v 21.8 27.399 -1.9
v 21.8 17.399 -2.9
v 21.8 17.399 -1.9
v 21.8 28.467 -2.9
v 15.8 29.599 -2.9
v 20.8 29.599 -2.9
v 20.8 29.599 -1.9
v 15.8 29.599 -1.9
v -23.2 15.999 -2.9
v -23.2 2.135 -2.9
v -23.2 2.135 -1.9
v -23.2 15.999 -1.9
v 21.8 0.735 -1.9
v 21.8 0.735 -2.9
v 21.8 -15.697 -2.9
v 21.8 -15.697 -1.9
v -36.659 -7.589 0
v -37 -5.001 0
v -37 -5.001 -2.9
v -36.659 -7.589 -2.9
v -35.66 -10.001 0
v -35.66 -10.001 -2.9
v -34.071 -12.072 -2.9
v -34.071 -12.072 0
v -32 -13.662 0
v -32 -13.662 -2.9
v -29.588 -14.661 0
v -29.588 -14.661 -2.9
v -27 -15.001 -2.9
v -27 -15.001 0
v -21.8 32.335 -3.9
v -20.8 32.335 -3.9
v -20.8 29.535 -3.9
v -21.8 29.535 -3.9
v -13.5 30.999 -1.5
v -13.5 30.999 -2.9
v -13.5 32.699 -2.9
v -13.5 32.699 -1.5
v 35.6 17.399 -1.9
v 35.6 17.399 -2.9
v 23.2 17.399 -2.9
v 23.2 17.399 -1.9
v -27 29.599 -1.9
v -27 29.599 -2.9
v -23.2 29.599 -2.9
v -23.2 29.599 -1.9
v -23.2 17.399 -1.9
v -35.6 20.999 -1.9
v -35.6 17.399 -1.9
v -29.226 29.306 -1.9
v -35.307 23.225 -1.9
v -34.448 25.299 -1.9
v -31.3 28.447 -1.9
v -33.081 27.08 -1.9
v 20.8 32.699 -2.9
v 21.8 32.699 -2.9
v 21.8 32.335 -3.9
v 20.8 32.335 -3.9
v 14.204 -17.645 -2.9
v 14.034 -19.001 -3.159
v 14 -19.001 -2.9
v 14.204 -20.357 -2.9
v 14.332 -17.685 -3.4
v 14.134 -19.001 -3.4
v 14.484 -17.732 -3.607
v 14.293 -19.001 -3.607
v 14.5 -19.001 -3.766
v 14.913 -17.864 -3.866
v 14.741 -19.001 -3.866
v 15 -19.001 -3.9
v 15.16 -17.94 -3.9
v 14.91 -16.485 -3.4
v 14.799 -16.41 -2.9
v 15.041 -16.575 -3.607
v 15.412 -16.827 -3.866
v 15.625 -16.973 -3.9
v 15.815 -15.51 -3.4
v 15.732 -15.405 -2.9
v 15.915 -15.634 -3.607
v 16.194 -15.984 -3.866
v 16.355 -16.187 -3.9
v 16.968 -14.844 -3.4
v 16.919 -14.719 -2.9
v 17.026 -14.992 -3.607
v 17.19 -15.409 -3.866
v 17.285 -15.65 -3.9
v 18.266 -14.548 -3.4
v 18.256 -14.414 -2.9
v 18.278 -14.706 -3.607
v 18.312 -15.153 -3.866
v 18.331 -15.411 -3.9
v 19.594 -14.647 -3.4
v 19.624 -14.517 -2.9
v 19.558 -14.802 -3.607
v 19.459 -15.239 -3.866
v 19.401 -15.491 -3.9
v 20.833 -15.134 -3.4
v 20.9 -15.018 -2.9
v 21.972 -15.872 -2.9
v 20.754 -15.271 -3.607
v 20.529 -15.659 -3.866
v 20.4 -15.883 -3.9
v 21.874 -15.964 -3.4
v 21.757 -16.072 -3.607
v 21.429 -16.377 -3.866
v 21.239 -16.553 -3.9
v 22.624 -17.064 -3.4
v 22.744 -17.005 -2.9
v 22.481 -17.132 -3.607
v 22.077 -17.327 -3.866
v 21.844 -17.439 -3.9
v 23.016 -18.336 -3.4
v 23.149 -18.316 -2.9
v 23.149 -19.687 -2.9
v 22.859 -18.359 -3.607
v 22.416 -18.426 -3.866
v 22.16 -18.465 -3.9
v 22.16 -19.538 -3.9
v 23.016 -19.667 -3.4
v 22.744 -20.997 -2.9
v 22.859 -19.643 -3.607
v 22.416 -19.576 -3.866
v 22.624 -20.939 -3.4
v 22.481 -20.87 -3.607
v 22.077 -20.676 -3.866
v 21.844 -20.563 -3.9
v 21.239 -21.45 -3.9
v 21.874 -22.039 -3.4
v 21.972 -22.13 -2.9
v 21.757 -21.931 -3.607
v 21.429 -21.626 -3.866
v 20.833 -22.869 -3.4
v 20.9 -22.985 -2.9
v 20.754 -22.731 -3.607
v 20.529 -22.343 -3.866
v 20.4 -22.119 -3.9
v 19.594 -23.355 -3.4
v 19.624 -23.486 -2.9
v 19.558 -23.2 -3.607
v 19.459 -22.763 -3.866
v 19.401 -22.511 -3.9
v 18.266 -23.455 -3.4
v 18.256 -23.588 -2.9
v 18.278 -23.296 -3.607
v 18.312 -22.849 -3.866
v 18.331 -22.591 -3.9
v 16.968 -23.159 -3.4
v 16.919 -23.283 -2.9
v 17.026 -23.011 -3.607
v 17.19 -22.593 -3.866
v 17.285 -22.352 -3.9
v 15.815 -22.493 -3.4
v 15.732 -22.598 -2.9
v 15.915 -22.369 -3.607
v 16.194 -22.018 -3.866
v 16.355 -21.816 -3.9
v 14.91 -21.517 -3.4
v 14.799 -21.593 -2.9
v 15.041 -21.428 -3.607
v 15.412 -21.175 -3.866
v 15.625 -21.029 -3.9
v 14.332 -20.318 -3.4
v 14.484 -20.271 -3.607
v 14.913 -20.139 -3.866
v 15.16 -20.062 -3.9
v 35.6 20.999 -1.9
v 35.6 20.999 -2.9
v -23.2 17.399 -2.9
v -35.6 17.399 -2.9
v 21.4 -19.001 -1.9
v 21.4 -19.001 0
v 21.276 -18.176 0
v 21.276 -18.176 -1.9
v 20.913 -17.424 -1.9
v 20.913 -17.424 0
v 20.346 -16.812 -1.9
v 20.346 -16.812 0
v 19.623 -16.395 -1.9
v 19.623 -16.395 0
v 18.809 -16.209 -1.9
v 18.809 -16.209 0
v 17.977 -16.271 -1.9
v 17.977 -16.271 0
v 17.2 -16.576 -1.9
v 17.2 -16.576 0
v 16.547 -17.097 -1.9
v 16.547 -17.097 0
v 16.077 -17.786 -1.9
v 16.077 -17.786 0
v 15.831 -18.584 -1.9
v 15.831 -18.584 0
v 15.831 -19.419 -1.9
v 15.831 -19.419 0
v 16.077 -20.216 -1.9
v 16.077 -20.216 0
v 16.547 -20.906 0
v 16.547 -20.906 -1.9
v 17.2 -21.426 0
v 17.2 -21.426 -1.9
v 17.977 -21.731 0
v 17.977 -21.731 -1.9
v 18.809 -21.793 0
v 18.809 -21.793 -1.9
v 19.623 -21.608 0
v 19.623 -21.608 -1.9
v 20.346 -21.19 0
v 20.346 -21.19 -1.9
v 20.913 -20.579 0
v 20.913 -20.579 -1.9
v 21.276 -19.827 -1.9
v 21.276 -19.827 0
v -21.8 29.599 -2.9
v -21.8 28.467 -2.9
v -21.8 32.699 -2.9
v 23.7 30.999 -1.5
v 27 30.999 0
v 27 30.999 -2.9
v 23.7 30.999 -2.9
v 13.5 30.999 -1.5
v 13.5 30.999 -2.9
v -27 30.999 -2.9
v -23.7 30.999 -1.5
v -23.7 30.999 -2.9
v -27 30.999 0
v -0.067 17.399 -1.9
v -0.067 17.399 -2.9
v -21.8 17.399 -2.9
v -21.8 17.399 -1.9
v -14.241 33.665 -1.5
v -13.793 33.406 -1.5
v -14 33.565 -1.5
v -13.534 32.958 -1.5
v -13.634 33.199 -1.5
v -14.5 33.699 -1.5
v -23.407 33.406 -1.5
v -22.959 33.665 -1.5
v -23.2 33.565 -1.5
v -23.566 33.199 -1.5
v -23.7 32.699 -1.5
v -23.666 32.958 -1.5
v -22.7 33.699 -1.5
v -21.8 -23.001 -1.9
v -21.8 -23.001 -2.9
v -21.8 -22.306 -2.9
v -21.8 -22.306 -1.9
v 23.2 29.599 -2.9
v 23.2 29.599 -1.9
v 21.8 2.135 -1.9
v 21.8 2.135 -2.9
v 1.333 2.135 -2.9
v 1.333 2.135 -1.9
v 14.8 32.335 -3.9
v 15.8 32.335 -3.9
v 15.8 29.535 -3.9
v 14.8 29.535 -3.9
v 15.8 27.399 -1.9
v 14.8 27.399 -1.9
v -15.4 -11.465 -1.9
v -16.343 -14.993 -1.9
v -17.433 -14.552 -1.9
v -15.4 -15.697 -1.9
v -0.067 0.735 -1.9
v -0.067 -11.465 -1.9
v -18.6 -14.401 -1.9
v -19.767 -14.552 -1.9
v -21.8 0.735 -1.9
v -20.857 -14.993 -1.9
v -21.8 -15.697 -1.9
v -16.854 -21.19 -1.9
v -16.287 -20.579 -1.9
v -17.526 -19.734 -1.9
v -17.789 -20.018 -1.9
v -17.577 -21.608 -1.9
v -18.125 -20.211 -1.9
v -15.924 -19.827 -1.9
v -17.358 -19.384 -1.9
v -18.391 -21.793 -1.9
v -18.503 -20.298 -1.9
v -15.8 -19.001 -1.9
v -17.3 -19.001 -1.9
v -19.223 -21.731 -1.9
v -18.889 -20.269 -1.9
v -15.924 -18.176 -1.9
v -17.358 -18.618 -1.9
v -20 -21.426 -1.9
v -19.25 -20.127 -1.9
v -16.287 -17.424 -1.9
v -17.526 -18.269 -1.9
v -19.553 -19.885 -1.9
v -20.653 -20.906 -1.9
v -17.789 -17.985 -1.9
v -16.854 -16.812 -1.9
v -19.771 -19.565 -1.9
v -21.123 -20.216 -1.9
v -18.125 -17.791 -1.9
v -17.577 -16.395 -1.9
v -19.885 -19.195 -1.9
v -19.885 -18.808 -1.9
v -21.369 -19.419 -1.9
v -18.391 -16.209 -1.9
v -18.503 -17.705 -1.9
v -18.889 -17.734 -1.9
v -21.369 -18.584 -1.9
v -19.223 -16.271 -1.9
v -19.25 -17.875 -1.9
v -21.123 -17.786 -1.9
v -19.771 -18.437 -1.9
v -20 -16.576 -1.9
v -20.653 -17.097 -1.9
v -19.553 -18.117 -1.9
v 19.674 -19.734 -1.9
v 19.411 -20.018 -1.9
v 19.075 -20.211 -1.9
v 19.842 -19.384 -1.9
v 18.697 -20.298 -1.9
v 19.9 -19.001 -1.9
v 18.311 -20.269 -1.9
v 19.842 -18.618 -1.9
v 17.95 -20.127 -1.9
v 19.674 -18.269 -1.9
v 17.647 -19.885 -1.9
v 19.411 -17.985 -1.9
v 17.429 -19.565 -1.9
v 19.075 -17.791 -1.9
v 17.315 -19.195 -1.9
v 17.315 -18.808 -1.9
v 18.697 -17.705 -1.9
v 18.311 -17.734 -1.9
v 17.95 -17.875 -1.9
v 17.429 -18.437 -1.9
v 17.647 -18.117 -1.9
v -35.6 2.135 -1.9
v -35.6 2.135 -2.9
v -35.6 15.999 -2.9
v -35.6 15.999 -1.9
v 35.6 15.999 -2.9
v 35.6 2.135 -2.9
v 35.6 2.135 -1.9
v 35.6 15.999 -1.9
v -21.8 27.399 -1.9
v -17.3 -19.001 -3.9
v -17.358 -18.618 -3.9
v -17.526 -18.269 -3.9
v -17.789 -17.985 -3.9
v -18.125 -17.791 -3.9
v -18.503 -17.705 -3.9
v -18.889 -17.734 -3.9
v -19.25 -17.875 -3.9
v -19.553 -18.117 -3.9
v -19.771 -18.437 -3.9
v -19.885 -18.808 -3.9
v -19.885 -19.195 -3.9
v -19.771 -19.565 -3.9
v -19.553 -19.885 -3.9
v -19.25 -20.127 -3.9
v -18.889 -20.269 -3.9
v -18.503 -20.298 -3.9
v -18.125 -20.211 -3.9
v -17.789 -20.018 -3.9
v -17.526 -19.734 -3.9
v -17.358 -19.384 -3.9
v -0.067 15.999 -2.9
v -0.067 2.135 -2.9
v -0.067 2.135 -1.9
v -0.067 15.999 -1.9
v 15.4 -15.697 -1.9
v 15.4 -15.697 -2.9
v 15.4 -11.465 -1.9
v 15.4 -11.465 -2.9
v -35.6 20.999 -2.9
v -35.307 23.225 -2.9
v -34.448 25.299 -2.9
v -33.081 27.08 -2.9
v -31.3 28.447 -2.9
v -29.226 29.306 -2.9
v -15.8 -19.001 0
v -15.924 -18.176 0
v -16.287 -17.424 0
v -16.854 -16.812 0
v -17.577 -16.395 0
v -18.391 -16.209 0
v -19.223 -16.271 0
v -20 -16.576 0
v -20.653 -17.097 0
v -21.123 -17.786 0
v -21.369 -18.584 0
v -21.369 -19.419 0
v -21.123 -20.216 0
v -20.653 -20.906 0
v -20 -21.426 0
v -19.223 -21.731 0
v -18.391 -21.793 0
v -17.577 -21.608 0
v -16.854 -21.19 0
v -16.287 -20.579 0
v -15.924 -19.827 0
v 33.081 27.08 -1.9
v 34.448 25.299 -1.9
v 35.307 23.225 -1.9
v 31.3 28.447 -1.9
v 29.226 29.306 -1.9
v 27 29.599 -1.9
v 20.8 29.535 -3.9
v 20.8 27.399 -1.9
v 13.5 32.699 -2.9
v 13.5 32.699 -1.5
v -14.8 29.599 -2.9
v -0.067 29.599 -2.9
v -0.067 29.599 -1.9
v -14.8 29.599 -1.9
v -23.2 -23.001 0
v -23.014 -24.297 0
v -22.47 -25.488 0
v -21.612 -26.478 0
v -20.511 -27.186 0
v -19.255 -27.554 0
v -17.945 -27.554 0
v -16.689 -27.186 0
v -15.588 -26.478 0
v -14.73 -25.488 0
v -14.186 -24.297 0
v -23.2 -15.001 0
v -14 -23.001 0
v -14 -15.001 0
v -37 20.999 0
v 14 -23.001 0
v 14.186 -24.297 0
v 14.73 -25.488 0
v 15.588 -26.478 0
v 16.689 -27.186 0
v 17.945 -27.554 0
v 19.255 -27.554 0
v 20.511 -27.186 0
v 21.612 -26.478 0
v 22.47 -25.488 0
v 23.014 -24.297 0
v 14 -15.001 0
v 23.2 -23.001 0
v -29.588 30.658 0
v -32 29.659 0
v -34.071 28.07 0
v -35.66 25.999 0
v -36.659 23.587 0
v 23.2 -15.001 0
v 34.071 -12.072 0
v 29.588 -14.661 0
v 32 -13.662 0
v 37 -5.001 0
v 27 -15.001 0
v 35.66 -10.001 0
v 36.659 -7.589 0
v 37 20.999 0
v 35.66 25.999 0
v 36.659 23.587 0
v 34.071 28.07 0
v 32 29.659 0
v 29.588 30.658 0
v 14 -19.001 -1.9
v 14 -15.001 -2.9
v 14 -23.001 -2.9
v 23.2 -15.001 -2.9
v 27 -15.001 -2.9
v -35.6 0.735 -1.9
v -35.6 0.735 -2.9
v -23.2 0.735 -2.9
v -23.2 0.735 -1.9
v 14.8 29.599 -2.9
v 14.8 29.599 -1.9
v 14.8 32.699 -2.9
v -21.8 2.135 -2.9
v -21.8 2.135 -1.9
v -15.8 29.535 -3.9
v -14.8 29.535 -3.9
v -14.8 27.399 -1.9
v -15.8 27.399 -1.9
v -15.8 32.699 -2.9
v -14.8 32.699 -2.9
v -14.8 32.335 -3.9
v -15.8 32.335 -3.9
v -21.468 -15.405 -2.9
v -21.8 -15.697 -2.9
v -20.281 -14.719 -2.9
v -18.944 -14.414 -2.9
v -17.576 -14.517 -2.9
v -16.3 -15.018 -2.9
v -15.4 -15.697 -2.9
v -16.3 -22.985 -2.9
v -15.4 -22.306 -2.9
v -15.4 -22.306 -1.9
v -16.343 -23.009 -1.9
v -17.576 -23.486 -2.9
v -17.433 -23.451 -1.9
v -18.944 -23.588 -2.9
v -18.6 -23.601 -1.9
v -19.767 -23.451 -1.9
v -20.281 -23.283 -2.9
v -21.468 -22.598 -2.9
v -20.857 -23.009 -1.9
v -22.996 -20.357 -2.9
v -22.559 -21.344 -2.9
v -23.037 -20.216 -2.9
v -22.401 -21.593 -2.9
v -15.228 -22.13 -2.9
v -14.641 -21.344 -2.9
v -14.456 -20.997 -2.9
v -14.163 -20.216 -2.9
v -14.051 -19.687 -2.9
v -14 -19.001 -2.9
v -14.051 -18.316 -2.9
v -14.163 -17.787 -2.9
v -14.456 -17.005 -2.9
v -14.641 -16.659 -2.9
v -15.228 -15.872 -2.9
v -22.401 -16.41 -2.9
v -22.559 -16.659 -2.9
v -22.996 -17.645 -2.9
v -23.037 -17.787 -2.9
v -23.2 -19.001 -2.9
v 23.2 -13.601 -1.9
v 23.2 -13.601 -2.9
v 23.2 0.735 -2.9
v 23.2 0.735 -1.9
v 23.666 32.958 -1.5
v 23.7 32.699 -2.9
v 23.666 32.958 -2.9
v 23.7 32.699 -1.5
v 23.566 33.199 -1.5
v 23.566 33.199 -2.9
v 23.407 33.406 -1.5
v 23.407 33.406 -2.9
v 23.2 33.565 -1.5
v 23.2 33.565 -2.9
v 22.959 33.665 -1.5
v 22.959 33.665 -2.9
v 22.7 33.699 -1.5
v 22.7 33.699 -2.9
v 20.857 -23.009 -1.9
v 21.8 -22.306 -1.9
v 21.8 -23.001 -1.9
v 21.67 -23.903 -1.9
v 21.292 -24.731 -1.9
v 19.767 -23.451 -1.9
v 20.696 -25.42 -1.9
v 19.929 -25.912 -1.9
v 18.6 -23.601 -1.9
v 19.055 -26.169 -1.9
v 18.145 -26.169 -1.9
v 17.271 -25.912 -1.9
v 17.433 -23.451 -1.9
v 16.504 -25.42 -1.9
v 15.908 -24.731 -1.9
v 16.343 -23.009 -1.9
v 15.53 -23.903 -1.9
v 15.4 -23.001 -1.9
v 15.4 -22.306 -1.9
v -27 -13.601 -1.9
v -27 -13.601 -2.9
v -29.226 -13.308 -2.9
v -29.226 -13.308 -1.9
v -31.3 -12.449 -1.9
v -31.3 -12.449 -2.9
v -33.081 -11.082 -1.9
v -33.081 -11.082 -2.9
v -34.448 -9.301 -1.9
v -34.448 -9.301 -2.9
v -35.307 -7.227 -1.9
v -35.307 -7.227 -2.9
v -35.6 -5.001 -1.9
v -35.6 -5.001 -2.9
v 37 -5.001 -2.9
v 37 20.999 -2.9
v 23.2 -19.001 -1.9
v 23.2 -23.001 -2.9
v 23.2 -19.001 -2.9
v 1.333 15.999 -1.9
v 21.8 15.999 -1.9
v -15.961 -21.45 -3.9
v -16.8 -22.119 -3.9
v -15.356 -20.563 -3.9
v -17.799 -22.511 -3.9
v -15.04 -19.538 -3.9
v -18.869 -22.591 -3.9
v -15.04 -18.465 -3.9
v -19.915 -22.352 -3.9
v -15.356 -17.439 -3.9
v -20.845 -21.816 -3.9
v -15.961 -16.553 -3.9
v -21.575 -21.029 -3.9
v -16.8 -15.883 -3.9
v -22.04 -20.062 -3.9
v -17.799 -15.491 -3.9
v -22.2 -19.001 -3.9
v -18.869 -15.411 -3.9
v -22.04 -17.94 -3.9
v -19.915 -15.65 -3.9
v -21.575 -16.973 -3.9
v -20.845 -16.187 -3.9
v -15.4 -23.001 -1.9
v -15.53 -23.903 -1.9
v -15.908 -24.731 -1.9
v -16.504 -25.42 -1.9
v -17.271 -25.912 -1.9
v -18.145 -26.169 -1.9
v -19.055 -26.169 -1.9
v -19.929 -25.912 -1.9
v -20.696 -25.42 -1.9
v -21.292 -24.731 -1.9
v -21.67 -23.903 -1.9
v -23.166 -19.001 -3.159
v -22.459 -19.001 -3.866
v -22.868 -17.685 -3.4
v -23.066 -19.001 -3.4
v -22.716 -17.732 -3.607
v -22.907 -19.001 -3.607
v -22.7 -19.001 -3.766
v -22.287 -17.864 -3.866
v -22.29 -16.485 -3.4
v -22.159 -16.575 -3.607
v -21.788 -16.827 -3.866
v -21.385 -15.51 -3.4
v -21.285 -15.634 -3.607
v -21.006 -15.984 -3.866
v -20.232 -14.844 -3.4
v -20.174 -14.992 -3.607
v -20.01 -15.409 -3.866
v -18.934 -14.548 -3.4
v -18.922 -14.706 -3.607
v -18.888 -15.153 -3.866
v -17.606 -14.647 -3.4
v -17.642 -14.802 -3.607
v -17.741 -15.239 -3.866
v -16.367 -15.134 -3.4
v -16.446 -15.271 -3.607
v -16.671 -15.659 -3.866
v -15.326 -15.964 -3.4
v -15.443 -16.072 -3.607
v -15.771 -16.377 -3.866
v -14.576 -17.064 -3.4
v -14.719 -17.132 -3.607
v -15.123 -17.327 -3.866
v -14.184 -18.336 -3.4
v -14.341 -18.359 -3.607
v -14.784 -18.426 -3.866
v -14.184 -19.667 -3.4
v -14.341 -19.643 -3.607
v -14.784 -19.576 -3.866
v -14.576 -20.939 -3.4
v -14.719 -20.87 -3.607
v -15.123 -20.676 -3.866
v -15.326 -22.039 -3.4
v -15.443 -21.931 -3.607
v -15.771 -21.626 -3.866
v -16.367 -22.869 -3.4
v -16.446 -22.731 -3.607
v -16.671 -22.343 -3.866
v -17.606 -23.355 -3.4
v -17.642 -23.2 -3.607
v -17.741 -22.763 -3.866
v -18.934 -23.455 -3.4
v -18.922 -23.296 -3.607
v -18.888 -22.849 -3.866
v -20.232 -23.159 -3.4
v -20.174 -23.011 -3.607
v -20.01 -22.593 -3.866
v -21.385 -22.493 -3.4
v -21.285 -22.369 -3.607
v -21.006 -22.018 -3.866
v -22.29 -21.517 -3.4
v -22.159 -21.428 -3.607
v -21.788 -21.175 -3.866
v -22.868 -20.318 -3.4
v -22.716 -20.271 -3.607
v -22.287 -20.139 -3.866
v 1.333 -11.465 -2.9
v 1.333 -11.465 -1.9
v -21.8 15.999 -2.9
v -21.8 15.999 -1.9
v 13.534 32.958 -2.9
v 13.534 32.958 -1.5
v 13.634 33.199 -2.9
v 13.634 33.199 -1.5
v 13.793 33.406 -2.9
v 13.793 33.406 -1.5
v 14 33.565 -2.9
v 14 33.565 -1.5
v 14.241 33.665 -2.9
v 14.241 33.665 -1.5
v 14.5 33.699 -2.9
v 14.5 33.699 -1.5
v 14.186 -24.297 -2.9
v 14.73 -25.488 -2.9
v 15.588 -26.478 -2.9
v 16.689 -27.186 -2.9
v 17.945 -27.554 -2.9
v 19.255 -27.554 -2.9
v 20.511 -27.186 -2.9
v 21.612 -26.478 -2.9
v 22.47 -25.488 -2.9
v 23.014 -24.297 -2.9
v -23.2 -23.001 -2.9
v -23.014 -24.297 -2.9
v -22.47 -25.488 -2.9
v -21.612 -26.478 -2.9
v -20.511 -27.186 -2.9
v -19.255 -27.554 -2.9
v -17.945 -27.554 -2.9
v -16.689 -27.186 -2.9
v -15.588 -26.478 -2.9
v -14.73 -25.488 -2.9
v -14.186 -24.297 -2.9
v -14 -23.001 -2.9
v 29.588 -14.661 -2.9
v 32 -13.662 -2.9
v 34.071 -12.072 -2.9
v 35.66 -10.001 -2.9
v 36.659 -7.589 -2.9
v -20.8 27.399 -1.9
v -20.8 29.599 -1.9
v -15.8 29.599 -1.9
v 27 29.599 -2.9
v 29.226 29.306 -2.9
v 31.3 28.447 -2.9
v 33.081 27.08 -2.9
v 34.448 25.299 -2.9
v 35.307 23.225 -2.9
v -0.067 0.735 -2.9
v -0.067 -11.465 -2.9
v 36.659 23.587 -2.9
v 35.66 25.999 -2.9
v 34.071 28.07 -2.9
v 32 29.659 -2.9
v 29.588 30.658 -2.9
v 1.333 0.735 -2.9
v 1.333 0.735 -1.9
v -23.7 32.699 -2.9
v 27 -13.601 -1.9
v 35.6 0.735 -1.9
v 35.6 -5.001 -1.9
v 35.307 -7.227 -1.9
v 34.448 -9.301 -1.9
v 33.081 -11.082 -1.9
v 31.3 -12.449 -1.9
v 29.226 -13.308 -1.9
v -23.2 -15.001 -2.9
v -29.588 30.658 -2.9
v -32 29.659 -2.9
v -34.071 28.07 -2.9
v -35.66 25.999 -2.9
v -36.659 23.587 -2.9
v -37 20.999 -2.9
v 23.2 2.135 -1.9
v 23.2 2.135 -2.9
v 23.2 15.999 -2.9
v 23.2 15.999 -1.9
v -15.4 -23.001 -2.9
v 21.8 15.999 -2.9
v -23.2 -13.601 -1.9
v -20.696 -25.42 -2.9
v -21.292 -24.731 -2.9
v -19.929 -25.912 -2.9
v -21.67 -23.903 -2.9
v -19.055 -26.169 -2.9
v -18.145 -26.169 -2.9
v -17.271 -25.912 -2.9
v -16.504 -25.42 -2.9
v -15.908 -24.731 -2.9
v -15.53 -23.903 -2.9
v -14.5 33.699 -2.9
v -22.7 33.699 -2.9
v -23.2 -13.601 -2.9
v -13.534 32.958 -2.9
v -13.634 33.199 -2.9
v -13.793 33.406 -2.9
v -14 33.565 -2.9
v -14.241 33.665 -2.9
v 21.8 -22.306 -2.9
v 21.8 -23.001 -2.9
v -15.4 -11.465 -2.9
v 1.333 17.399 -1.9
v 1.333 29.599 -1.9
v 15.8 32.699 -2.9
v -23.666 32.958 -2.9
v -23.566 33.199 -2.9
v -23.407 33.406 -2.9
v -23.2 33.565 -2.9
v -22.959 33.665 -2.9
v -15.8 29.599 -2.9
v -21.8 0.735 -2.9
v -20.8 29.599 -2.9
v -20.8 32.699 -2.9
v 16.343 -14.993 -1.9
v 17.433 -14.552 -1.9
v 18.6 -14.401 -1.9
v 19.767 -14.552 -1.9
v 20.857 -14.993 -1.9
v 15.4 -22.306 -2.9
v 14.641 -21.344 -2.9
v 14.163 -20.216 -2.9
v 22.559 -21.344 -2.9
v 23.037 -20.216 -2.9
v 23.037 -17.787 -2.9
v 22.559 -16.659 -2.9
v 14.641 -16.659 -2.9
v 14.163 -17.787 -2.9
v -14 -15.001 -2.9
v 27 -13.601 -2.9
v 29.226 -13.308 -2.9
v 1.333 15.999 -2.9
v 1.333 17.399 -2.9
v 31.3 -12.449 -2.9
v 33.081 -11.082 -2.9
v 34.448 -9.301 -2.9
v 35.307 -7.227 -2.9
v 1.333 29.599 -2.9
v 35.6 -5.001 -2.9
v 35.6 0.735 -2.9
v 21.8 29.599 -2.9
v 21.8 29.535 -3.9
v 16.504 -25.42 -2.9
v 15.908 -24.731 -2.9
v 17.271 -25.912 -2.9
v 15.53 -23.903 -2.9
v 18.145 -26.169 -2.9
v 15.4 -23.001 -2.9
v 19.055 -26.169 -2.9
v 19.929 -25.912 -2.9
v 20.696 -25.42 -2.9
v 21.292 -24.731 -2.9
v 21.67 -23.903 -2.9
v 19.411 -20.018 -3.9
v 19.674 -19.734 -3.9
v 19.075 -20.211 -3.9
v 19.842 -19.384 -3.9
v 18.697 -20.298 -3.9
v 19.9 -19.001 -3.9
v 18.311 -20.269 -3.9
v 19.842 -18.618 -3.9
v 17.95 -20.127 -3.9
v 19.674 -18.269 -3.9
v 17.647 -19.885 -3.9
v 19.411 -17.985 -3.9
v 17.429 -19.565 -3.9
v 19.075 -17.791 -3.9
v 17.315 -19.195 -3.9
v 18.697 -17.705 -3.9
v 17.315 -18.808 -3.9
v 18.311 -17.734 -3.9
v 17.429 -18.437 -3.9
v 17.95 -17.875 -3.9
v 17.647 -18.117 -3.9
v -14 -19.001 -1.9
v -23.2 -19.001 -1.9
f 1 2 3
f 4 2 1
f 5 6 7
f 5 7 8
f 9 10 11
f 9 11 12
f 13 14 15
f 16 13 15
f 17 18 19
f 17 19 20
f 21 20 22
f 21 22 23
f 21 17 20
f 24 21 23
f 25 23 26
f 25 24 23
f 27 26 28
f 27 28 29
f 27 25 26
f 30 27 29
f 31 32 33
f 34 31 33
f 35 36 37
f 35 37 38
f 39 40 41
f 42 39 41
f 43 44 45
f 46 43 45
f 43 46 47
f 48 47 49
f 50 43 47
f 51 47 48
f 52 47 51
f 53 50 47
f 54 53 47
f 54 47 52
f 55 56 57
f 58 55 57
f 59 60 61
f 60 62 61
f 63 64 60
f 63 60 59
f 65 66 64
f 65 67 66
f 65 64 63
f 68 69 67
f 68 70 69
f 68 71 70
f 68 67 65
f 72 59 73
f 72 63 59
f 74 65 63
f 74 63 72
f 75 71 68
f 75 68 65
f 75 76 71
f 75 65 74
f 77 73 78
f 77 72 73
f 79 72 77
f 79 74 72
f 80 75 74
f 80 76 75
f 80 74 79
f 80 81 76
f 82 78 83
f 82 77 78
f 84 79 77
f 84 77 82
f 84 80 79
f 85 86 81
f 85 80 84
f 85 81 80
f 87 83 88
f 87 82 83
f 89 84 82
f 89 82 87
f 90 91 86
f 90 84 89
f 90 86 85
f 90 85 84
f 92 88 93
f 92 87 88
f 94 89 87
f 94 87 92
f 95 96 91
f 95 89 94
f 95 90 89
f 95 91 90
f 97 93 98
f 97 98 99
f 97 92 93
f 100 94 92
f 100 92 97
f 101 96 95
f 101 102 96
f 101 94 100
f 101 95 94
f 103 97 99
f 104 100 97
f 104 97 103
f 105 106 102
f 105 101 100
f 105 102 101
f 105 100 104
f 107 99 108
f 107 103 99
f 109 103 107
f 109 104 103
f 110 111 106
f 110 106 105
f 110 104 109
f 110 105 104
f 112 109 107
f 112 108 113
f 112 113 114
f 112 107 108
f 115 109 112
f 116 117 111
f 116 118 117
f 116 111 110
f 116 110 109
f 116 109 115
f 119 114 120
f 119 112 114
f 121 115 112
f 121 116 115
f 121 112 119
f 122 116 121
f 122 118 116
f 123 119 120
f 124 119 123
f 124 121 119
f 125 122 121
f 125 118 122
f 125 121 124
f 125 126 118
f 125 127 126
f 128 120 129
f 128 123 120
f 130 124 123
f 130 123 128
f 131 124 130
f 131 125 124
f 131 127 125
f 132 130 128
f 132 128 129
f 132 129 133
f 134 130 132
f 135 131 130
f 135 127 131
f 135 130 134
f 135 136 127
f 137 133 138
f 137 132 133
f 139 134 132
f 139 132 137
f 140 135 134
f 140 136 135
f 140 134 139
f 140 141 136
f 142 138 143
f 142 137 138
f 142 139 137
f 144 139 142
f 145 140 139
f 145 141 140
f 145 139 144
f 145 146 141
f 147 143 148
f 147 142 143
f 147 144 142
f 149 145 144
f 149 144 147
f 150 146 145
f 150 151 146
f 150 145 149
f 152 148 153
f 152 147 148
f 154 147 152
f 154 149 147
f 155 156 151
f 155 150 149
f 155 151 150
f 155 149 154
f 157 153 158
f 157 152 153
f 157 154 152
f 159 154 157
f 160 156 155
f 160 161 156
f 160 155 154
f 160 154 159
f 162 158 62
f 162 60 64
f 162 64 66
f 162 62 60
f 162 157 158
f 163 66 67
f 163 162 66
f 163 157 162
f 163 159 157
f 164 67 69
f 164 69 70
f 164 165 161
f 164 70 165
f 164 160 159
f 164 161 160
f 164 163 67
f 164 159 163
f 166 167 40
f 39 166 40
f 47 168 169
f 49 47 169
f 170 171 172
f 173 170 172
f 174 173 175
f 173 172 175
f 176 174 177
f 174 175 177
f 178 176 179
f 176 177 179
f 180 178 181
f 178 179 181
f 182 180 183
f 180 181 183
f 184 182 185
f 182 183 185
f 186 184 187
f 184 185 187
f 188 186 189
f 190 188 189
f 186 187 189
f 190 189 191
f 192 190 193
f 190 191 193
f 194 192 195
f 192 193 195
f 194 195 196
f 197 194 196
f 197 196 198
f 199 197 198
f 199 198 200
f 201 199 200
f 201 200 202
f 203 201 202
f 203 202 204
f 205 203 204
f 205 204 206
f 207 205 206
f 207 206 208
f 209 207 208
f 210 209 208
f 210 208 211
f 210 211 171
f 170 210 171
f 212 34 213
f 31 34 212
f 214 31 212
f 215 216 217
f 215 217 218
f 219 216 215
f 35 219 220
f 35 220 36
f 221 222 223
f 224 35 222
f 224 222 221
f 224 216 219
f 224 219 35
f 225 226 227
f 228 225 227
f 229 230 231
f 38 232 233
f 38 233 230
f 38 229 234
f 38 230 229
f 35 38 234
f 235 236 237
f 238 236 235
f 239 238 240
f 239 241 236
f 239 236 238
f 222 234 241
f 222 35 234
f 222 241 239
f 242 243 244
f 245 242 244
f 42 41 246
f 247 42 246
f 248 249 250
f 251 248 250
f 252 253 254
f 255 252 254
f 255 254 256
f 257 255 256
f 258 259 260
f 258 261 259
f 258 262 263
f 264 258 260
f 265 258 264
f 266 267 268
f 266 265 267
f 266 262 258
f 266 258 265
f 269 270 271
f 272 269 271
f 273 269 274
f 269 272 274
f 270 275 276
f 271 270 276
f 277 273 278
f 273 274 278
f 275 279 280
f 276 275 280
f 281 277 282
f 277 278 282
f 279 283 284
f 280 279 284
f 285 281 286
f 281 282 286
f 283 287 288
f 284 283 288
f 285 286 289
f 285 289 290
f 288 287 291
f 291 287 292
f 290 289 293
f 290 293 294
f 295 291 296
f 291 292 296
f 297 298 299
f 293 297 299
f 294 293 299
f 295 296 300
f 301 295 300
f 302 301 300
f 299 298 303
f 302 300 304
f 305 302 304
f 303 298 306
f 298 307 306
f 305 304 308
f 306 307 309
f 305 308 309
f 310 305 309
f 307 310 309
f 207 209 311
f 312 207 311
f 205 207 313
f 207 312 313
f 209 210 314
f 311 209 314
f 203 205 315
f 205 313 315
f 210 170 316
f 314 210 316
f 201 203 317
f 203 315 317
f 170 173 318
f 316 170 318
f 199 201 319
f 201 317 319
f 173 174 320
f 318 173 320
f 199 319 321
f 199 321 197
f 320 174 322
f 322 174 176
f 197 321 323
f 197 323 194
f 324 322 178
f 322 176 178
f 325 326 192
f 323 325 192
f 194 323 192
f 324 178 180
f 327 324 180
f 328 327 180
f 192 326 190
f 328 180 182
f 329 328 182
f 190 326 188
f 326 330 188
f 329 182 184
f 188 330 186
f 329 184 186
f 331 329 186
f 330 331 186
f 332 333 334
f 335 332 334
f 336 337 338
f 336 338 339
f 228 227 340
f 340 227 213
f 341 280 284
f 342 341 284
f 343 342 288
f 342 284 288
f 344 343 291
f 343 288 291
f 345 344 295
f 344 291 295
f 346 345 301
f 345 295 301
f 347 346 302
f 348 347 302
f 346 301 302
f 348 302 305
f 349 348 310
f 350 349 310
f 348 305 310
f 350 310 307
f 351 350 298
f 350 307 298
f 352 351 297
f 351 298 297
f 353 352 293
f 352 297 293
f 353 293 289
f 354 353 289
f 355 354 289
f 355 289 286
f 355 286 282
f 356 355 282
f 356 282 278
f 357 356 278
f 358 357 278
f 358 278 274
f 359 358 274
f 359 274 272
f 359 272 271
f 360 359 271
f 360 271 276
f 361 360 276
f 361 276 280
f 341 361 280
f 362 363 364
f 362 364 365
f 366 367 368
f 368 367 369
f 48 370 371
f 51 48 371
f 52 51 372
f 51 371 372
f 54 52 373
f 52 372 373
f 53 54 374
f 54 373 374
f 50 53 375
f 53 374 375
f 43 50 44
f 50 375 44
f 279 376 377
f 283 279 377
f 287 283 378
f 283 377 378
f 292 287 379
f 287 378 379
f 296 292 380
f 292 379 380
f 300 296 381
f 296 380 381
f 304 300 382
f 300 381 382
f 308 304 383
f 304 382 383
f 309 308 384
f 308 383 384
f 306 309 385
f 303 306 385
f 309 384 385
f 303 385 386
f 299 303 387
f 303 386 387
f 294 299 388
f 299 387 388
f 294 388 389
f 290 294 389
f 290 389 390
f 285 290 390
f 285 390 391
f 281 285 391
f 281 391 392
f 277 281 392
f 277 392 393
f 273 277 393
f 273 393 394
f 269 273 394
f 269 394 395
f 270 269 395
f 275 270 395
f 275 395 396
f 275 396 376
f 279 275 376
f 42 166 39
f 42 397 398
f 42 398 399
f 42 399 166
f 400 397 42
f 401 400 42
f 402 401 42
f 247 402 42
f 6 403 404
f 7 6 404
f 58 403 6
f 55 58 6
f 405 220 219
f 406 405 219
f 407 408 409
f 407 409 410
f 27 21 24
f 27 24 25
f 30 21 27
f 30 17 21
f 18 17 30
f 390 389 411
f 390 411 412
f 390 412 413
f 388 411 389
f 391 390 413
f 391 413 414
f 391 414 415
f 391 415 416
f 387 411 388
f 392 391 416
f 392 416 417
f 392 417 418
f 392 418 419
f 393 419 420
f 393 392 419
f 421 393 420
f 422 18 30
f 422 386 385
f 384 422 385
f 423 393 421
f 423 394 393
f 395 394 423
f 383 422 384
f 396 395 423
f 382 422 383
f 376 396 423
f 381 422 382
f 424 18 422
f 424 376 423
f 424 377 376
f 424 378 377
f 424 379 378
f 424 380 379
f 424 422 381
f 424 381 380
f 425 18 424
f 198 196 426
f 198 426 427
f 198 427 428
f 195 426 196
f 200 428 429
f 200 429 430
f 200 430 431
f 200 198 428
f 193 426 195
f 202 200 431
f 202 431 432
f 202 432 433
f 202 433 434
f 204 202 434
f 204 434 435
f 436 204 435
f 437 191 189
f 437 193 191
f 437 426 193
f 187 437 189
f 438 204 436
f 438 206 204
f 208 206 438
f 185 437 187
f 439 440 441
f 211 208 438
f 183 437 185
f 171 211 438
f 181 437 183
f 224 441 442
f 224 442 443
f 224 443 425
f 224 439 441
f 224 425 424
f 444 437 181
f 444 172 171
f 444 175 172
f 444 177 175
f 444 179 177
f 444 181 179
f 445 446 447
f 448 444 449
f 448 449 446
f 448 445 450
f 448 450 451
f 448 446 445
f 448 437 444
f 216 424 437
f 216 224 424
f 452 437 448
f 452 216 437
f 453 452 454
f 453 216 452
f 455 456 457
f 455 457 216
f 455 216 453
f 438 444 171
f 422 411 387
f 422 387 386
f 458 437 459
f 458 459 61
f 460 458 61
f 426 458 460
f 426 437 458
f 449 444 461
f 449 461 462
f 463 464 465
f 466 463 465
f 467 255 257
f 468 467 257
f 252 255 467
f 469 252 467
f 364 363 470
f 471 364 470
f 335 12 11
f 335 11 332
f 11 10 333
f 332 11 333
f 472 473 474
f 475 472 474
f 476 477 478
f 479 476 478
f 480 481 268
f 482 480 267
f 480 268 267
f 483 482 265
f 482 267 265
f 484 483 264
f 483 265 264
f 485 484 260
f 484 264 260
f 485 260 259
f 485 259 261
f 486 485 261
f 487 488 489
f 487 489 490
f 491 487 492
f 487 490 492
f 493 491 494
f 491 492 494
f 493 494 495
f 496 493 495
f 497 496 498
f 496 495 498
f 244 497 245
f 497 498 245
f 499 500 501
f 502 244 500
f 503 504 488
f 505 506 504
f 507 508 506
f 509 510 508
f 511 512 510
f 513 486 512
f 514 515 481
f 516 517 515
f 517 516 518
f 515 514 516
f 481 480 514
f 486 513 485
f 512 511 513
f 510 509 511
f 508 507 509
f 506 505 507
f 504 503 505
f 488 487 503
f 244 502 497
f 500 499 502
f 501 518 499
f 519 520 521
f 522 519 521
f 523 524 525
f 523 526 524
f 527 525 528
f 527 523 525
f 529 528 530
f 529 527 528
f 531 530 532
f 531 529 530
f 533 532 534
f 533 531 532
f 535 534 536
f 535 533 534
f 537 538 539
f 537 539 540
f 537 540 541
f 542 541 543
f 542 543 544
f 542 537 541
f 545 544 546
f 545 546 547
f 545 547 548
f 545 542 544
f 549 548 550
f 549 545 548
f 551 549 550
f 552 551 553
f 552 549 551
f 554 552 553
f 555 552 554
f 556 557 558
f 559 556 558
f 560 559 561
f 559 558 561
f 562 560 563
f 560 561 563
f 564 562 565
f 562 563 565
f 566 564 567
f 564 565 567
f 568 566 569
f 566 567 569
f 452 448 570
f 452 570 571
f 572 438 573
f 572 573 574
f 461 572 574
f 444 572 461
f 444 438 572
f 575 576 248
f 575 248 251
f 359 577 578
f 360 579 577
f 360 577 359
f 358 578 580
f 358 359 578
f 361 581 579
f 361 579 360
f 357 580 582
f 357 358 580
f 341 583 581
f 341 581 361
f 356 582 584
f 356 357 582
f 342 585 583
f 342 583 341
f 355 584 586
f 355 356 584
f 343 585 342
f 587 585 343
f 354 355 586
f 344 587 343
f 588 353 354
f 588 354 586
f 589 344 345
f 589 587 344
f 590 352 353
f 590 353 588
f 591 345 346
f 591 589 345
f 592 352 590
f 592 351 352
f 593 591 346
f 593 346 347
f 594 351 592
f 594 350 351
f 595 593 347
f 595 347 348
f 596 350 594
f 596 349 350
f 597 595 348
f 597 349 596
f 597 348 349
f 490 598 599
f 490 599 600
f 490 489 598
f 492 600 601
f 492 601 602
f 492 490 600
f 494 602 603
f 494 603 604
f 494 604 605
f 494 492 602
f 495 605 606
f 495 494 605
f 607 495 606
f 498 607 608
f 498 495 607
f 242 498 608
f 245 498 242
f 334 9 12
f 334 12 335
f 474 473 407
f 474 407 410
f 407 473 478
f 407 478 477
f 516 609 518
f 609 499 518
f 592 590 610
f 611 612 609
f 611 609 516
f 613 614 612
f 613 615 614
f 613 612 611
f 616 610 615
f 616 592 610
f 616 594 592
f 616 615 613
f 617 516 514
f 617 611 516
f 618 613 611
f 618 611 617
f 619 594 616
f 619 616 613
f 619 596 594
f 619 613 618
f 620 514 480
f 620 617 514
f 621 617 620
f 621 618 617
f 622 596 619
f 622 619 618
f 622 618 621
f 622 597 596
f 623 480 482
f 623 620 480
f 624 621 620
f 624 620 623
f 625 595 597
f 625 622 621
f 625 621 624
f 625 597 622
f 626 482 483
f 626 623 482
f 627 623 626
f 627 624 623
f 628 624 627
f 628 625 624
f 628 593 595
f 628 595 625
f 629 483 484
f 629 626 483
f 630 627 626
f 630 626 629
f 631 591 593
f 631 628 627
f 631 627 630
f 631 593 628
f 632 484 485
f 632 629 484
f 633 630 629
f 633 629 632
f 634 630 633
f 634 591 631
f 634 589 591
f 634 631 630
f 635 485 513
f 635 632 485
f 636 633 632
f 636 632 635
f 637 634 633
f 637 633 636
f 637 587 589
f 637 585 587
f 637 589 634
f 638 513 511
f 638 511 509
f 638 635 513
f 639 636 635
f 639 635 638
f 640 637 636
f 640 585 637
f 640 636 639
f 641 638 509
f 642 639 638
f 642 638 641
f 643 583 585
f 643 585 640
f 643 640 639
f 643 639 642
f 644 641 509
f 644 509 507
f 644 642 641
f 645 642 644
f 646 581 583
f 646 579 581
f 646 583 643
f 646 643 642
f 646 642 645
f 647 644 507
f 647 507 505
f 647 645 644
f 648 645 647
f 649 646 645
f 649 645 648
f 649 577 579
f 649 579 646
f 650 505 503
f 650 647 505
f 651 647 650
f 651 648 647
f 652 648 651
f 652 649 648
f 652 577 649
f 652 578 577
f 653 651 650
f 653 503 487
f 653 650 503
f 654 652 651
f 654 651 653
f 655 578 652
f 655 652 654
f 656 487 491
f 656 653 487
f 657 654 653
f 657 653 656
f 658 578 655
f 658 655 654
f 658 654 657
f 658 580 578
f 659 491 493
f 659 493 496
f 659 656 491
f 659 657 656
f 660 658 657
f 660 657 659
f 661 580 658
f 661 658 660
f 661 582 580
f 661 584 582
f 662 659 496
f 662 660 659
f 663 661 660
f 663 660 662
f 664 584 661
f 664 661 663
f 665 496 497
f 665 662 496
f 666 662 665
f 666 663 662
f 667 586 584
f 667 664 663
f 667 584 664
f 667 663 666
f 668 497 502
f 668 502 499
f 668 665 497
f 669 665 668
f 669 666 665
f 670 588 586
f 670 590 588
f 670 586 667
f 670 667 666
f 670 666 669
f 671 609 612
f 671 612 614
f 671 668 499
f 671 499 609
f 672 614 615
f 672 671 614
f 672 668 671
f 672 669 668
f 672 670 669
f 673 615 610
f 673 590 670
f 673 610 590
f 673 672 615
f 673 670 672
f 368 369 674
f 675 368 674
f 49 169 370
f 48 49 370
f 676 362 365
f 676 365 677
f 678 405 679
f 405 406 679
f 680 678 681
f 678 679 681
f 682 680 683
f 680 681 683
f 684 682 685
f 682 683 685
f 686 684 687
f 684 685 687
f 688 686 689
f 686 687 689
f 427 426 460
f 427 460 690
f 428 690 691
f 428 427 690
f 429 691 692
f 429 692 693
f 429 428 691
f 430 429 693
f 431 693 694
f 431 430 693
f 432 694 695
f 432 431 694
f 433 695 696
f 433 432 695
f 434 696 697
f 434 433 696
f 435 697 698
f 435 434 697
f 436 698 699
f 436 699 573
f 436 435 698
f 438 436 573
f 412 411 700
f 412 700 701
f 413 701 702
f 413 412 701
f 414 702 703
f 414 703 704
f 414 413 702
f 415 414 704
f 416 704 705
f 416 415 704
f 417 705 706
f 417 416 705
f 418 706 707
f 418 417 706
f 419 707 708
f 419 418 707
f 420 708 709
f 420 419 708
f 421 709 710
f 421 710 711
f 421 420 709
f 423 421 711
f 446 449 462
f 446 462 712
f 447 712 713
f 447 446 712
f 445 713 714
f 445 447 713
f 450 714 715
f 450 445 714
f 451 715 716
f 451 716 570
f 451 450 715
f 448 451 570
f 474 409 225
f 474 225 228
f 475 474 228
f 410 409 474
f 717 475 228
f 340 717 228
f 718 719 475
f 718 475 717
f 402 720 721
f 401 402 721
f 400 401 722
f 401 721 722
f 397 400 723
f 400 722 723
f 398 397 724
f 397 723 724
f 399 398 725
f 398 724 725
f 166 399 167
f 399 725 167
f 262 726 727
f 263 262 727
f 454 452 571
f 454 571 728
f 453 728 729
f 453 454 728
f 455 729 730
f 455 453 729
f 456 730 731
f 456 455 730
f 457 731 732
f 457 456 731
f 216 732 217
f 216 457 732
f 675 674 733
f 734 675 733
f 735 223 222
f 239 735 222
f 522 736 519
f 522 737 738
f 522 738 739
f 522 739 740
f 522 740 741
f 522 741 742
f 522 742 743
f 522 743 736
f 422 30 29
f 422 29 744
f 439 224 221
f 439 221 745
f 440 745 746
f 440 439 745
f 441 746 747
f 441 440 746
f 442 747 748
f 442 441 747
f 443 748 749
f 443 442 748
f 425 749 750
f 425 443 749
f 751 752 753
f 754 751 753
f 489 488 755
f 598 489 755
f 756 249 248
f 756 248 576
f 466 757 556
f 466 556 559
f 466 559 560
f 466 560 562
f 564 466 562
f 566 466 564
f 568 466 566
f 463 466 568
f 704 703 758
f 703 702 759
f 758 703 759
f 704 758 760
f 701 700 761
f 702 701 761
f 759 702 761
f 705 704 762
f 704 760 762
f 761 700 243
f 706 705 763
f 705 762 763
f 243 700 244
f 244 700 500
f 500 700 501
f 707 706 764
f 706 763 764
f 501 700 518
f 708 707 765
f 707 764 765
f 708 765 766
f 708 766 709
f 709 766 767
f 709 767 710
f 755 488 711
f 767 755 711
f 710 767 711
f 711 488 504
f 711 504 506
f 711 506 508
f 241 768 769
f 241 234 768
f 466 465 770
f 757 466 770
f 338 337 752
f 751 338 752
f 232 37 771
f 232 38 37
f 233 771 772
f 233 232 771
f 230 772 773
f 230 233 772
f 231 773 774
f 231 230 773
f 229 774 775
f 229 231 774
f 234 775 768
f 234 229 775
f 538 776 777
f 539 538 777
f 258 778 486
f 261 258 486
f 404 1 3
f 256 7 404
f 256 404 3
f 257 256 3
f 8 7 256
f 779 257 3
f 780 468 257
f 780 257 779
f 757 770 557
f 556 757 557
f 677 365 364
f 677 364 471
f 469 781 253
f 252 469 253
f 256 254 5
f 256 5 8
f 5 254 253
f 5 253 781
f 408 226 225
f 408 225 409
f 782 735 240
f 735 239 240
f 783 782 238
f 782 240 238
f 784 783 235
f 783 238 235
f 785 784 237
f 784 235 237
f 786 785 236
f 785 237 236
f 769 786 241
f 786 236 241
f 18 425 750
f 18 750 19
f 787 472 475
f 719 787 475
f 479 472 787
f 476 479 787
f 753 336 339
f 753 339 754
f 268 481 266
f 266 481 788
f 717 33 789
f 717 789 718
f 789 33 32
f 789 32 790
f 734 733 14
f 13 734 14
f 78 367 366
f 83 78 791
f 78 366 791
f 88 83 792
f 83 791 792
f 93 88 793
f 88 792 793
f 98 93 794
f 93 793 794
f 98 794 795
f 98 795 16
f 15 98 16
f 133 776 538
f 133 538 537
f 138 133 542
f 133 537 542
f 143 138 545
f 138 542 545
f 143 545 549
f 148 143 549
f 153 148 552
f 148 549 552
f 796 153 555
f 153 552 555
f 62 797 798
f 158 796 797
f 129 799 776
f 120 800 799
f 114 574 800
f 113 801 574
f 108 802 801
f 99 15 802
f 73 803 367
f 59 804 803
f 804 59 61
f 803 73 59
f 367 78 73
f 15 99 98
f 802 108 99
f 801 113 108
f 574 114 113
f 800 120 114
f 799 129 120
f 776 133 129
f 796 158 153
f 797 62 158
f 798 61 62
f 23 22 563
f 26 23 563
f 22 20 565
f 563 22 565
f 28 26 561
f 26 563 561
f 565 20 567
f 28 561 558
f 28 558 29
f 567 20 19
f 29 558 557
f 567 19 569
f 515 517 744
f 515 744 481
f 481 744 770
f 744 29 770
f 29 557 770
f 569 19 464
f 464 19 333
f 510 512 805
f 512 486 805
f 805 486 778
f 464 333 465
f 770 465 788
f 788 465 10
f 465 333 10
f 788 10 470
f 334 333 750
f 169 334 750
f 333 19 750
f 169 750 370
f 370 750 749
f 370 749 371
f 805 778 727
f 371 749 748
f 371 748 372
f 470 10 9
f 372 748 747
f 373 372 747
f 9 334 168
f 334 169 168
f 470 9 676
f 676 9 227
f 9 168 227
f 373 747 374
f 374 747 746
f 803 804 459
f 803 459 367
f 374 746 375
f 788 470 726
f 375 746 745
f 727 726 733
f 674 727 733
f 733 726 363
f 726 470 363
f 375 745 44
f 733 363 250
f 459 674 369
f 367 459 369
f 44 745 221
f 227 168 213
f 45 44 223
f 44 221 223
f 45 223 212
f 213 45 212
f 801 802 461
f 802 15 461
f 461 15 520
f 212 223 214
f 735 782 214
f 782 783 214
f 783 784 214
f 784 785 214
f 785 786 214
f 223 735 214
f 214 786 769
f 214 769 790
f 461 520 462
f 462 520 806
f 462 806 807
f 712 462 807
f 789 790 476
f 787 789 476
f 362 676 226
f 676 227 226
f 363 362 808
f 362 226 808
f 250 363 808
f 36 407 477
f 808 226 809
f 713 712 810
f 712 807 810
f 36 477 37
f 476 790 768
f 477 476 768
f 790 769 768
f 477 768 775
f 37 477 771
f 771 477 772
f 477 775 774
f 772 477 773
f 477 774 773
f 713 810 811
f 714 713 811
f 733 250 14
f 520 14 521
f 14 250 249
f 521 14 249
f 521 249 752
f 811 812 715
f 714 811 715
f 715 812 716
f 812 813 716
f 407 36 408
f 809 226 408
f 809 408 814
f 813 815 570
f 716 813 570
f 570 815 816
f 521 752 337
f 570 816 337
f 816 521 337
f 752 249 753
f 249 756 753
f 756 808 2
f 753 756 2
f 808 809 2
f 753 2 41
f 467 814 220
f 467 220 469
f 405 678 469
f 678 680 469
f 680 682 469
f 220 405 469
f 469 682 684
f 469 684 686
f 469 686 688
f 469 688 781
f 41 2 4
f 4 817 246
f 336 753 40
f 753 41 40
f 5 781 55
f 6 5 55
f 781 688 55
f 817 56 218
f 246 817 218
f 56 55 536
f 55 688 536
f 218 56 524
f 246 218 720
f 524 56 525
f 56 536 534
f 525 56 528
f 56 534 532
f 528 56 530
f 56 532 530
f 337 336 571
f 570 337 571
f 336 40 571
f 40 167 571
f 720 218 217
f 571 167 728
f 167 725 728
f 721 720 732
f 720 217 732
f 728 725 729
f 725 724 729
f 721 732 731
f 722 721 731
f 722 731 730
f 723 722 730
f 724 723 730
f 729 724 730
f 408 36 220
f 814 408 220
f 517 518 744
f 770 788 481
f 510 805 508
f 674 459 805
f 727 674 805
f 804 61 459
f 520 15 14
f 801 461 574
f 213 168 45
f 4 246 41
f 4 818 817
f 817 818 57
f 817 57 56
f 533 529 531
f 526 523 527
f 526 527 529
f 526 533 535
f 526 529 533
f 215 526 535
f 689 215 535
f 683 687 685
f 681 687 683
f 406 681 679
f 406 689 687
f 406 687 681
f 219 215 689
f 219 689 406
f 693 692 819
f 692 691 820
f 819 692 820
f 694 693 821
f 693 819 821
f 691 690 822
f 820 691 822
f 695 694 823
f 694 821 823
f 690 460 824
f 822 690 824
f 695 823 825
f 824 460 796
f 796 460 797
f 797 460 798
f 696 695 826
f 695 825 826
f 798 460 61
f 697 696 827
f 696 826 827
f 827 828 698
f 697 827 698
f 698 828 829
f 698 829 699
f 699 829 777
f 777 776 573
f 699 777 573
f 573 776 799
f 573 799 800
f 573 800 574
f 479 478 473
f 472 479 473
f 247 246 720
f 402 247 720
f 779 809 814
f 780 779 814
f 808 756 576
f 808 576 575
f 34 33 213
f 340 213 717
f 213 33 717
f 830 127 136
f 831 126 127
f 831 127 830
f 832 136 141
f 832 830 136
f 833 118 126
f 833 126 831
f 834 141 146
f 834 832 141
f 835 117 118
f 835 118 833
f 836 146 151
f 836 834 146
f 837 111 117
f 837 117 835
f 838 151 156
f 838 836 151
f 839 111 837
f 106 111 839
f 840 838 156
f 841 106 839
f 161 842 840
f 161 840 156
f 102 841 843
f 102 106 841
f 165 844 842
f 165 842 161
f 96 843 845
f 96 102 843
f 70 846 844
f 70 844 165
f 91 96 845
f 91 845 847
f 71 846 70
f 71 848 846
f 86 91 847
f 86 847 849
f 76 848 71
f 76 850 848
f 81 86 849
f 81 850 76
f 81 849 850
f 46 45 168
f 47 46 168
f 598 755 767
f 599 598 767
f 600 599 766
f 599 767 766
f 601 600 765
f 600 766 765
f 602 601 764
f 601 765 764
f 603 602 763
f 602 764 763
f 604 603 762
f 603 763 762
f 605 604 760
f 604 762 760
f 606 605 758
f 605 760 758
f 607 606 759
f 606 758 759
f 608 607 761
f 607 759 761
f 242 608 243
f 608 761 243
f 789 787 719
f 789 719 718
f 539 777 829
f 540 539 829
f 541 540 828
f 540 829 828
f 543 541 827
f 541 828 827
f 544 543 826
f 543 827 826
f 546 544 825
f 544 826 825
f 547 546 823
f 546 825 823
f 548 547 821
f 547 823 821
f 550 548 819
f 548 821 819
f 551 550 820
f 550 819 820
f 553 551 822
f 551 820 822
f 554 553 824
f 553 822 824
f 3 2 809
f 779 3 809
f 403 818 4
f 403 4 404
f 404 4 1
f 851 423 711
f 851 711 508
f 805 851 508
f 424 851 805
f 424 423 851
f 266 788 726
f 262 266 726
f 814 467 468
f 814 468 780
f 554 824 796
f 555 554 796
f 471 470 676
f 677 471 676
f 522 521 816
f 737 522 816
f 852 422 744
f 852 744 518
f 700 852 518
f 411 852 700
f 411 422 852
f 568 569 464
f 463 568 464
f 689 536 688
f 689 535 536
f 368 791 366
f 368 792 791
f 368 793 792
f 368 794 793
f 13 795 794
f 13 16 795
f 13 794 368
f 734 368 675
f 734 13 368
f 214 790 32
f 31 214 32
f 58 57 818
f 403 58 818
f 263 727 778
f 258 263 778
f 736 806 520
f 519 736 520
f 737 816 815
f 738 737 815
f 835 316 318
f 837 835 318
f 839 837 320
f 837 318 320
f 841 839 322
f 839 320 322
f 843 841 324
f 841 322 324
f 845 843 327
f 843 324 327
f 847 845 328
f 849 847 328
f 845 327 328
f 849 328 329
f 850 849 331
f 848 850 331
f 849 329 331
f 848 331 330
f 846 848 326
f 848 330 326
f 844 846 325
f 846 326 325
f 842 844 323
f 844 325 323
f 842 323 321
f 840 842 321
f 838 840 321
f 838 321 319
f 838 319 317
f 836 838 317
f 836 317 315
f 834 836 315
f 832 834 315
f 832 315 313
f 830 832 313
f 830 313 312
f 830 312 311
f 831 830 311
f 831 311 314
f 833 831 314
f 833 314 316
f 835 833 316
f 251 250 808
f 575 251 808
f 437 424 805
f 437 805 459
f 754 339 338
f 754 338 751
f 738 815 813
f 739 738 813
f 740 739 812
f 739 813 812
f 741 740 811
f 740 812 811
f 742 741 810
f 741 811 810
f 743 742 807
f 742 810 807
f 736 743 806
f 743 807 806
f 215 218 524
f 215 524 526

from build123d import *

# Parameters (mm, degrees)
EXTRUSION1_DEPTH                  = 2.9
ESQUISSE2_W                       = 10.2
ESQUISSE2_H                       = 1.4
EXTRUSION2_DEPTH                  = 2.7
CONG_1_R                          = 1
ESQUISSE3_W                       = 20.466591469
ESQUISSE3_H                       = 12.2
ESQUISSE3_W_2                     = 21.733408531
ESQUISSE3_W_3                     = 12.4
ESQUISSE3_H_2                     = 13.863540316
ENL_V_MAT_EXTRU_1_DEPTH           = 1
ESQUISSE4_R                       = 2.8
ENL_V_MAT_EXTRU_2_DEPTH           = 2
EXTRUSION3_DEPTH                  = 1
EXTRUSION3_DEPTH_BACK             = 1
ESQUISSE5_R                       = 4.6
CONG_2_R                          = 1
ESQUISSE6_R                       = 1.3
ENL_V_MAT_EXTRU_4_DEPTH           = 51.085976067
EXTRUSION4_DEPTH                  = 1
R_P_TITION_LIN_AIRE1_COUNT        = 2
R_P_TITION_LIN_AIRE1_PITCH        = 6
R_P_TITION_LIN_AIRE2_COUNT        = 2
R_P_TITION_LIN_AIRE2_PITCH        = 36.6
R_P_TITION_LIN_AIRE2_COPY_1_DEPTH = 1


with BuildPart() as part:
    # Esquisse1 → Extrusion1 (new body)
    with BuildSketch(Plane.XY):
        with BuildLine():
            Line((23.2, -23.001261172), (23.2, -15.001261172))
            Line((23.2, -15.001261172), (27, -15.001261172))
            ThreePointArc((27, -15.001261172), (34.071067812, -12.072328984), (37, -5.001261172))
            Line((37, -5.001261172), (37, 20.998738828))
            ThreePointArc((37, 20.998738828), (34.071067812, 28.069806639), (27, 30.998738828))
            Line((27, 30.998738828), (-27, 30.998738828))
            ThreePointArc((-27, 30.998738828), (-34.071067812, 28.069806639), (-37, 20.998738828))
            Line((-37, 20.998738828), (-37, -5.001261172))
            ThreePointArc((-37, -5.001261172), (-34.071067812, -12.072328984), (-27, -15.001261172))
            Line((-27, -15.001261172), (-23.2, -15.001261172))
            Line((-23.2, -15.001261172), (-23.2, -23.001261172))
            ThreePointArc((-23.2, -23.001261172), (-18.6, -27.601261172), (-14, -23.001261172))
            Line((-14, -23.001261172), (-14, -15.001261172))
            Line((-14, -15.001261172), (14, -15.001261172))
            Line((14, -15.001261172), (14, -23.001261172))
            ThreePointArc((14, -23.001261172), (18.6, -27.601261172), (23.2, -23.001261172))
        make_face()
    extrude(amount=-EXTRUSION1_DEPTH)

    # Esquisse2 → Extrusion2 (add)
    with BuildSketch(Plane(origin=(0, 30.998738828, 0), x_dir=(-1, 0, 0), z_dir=(0, 1, 0))):
        with Locations((-18.6, -2.2)):
            Rectangle(ESQUISSE2_W, ESQUISSE2_H)
        with Locations((18.6, -2.2)):
            Rectangle(ESQUISSE2_W, ESQUISSE2_H)
    extrude(amount=EXTRUSION2_DEPTH)

    # Congé1
    cong_1_edges = [part.edges().sort_by_distance(p)[0] for p in [
        (23.7, 33.698738828, -2.2),
        (13.5, 33.698738828, -2.2),
        (-23.7, 33.698738828, -2.2),
        (-13.5, 33.698738828, -2.2),
    ]]
    fillet(cong_1_edges, radius=CONG_1_R)

    # Esquisse3 → Enlèv. mat.-Extru.1 (cut)
    with BuildSketch(Plane(origin=(0, 0, -2.9), x_dir=(-1, 0, 0), z_dir=(0, 0, -1))):
        with BuildLine():
            Line((35.6, -5.001261172), (35.6, 0.735198512))
            Line((35.6, 0.735198512), (23.2, 0.735198512))
            Line((23.2, 0.735198512), (23.2, -13.601261172))
            Line((23.2, -13.601261172), (27, -13.601261172))
            ThreePointArc((27, -13.601261172), (33.081118318, -11.082379491), (35.6, -5.001261172))
        make_face()
        with BuildLine():
            Line((21.8, -23.001261172), (21.8, -13.601261172))
            Line((21.8, -13.601261172), (21.8, 0.735198512))
            Line((21.8, 0.735198512), (0.066591469, 0.735198512))
            Line((0.066591469, 0.735198512), (0.066591469, -11.464801488))
            Line((0.066591469, -11.464801488), (15.4, -11.464801488))
            Line((15.4, -11.464801488), (15.4, -23.001261172))
            ThreePointArc((15.4, -23.001261172), (18.6, -26.201261172), (21.8, -23.001261172))
        make_face()
        with BuildLine():
            Line((-15.4, -11.464801488), (-1.333408531, -11.464801488))
            Line((-1.333408531, -11.464801488), (-1.333408531, 0.735198512))
            Line((-1.333408531, 0.735198512), (-21.8, 0.735198512))
            Line((-21.8, 0.735198512), (-21.8, -13.601261172))
            Line((-21.8, -13.601261172), (-21.8, -23.001261172))
            ThreePointArc((-21.8, -23.001261172), (-18.6, -26.201261172), (-15.4, -23.001261172))
            Line((-15.4, -23.001261172), (-15.4, -11.464801488))
        make_face()
        with BuildLine():
            Line((-27, -13.601261172), (-23.2, -13.601261172))
            Line((-23.2, -13.601261172), (-23.2, 0.735198512))
            Line((-23.2, 0.735198512), (-35.6, 0.735198512))
            Line((-35.6, 0.735198512), (-35.6, -5.001261172))
            ThreePointArc((-35.6, -5.001261172), (-33.081118318, -11.082379491), (-27, -13.601261172))
        make_face()
        with BuildLine():
            Line((-35.6, 20.998738828), (-35.6, 17.398738828))
            Line((-35.6, 17.398738828), (-23.2, 17.398738828))
            Line((-23.2, 17.398738828), (-23.2, 29.598738828))
            Line((-23.2, 29.598738828), (-27, 29.598738828))
            ThreePointArc((-27, 29.598738828), (-33.081118318, 27.079857146), (-35.6, 20.998738828))
        make_face()
        with BuildLine():
            Line((27, 29.598738828), (23.2, 29.598738828))
            Line((23.2, 29.598738828), (23.2, 17.398738828))
            Line((23.2, 17.398738828), (35.6, 17.398738828))
            Line((35.6, 17.398738828), (35.6, 20.998738828))
            ThreePointArc((35.6, 20.998738828), (33.081118318, 27.079857146), (27, 29.598738828))
        make_face()
        with Locations((-11.566704266, 23.498738828)):
            Rectangle(ESQUISSE3_W, ESQUISSE3_H)
        with Locations((10.933295734, 23.498738828)):
            Rectangle(ESQUISSE3_W_2, ESQUISSE3_H)
        with Locations((-29.4, 9.06696867)):
            Rectangle(ESQUISSE3_W_3, ESQUISSE3_H_2)
        with Locations((-11.566704266, 9.06696867)):
            Rectangle(ESQUISSE3_W, ESQUISSE3_H_2)
        with Locations((10.933295734, 9.06696867)):
            Rectangle(ESQUISSE3_W_2, ESQUISSE3_H_2)
        with Locations((29.4, 9.06696867)):
            Rectangle(ESQUISSE3_W_3, ESQUISSE3_H_2)
    extrude(amount=-ENL_V_MAT_EXTRU_1_DEPTH, mode=Mode.SUBTRACT)

    # Esquisse4 → Enlèv. mat.-Extru.2 (cut)
    with BuildSketch(Plane.XY):
        with Locations((-18.6, -19.001261172)):
            Circle(ESQUISSE4_R)
        with Locations((18.6, -19.001261172)):
            Circle(ESQUISSE4_R)
    extrude(amount=-ENL_V_MAT_EXTRU_2_DEPTH, mode=Mode.SUBTRACT)

    # Esquisse5 → Extrusion3 (add, two sides: drawn at the far end of the back side and taken through both)
    with BuildSketch(Plane(origin=(0, 0, -2.9), x_dir=(-1, 0, 0), z_dir=(0, 0, -1)).offset(-EXTRUSION3_DEPTH_BACK)):
        with Locations((-18.6, -19.001261172)):
            Circle(ESQUISSE5_R)
        with Locations((18.6, -19.001261172)):
            Circle(ESQUISSE5_R)
    extrude(amount=EXTRUSION3_DEPTH + EXTRUSION3_DEPTH_BACK)

    # Congé2
    cong_2_edges = [part.edges().sort_by_distance(p)[0] for p in [
        (23.2, -19.001261172, -3.9),
        (-14, -19.001261172, -3.9),
    ]]
    fillet(cong_2_edges, radius=CONG_2_R - 0.0001)  # a hair under: the kernel refuses the full size

    # Esquisse6 → Enlèv. mat.-Extru.4 (cut, through all)
    with BuildSketch(Plane.XY.offset(-1.9)):
        with Locations((18.6, -19.001261172)):
            Circle(ESQUISSE6_R)
        with Locations((-18.6, -19.001261172)):
            Circle(ESQUISSE6_R)
    extrude(amount=-ENL_V_MAT_EXTRU_4_DEPTH, mode=Mode.SUBTRACT)

    # Esquisse7 → Extrusion4 (add)
    with BuildSketch(Plane.ZY.offset(-21.8)):
        Polygon((-2.9, 32.698738828), (-3.9, 32.334768593), (-3.9, 29.534768593), (-1.9, 27.398738828), (-1.9, 29.598738828), (-2.9, 29.598738828), align=None)
    extrusion4 = extrude(amount=EXTRUSION4_DEPTH)

    # Répétition linéaire1: Extrusion4 ×2
    with Locations(*[(-i * R_P_TITION_LIN_AIRE1_PITCH, 0, 0) for i in range(1, R_P_TITION_LIN_AIRE1_COUNT)]):
        add(extrusion4)

    # Répétition linéaire2: Extrusion4 ×2
    with Locations(*[(-i * R_P_TITION_LIN_AIRE2_PITCH, 0, 0) for i in range(1, R_P_TITION_LIN_AIRE2_COUNT)]):
        add(extrusion4)

    # Répétition linéaire2 copy 1 sketch → Répétition linéaire2 copy 1 (add)
    with BuildSketch(Plane.ZY.offset(20.8)):
        Polygon((-2.9, 32.698738828), (-3.9, 32.334768593), (-3.9, 29.534768593), (-1.9, 27.398738828), (-1.9, 29.598738828), (-2.9, 29.598738828), align=None)
    extrude(amount=R_P_TITION_LIN_AIRE2_COPY_1_DEPTH)


solid = part.part
